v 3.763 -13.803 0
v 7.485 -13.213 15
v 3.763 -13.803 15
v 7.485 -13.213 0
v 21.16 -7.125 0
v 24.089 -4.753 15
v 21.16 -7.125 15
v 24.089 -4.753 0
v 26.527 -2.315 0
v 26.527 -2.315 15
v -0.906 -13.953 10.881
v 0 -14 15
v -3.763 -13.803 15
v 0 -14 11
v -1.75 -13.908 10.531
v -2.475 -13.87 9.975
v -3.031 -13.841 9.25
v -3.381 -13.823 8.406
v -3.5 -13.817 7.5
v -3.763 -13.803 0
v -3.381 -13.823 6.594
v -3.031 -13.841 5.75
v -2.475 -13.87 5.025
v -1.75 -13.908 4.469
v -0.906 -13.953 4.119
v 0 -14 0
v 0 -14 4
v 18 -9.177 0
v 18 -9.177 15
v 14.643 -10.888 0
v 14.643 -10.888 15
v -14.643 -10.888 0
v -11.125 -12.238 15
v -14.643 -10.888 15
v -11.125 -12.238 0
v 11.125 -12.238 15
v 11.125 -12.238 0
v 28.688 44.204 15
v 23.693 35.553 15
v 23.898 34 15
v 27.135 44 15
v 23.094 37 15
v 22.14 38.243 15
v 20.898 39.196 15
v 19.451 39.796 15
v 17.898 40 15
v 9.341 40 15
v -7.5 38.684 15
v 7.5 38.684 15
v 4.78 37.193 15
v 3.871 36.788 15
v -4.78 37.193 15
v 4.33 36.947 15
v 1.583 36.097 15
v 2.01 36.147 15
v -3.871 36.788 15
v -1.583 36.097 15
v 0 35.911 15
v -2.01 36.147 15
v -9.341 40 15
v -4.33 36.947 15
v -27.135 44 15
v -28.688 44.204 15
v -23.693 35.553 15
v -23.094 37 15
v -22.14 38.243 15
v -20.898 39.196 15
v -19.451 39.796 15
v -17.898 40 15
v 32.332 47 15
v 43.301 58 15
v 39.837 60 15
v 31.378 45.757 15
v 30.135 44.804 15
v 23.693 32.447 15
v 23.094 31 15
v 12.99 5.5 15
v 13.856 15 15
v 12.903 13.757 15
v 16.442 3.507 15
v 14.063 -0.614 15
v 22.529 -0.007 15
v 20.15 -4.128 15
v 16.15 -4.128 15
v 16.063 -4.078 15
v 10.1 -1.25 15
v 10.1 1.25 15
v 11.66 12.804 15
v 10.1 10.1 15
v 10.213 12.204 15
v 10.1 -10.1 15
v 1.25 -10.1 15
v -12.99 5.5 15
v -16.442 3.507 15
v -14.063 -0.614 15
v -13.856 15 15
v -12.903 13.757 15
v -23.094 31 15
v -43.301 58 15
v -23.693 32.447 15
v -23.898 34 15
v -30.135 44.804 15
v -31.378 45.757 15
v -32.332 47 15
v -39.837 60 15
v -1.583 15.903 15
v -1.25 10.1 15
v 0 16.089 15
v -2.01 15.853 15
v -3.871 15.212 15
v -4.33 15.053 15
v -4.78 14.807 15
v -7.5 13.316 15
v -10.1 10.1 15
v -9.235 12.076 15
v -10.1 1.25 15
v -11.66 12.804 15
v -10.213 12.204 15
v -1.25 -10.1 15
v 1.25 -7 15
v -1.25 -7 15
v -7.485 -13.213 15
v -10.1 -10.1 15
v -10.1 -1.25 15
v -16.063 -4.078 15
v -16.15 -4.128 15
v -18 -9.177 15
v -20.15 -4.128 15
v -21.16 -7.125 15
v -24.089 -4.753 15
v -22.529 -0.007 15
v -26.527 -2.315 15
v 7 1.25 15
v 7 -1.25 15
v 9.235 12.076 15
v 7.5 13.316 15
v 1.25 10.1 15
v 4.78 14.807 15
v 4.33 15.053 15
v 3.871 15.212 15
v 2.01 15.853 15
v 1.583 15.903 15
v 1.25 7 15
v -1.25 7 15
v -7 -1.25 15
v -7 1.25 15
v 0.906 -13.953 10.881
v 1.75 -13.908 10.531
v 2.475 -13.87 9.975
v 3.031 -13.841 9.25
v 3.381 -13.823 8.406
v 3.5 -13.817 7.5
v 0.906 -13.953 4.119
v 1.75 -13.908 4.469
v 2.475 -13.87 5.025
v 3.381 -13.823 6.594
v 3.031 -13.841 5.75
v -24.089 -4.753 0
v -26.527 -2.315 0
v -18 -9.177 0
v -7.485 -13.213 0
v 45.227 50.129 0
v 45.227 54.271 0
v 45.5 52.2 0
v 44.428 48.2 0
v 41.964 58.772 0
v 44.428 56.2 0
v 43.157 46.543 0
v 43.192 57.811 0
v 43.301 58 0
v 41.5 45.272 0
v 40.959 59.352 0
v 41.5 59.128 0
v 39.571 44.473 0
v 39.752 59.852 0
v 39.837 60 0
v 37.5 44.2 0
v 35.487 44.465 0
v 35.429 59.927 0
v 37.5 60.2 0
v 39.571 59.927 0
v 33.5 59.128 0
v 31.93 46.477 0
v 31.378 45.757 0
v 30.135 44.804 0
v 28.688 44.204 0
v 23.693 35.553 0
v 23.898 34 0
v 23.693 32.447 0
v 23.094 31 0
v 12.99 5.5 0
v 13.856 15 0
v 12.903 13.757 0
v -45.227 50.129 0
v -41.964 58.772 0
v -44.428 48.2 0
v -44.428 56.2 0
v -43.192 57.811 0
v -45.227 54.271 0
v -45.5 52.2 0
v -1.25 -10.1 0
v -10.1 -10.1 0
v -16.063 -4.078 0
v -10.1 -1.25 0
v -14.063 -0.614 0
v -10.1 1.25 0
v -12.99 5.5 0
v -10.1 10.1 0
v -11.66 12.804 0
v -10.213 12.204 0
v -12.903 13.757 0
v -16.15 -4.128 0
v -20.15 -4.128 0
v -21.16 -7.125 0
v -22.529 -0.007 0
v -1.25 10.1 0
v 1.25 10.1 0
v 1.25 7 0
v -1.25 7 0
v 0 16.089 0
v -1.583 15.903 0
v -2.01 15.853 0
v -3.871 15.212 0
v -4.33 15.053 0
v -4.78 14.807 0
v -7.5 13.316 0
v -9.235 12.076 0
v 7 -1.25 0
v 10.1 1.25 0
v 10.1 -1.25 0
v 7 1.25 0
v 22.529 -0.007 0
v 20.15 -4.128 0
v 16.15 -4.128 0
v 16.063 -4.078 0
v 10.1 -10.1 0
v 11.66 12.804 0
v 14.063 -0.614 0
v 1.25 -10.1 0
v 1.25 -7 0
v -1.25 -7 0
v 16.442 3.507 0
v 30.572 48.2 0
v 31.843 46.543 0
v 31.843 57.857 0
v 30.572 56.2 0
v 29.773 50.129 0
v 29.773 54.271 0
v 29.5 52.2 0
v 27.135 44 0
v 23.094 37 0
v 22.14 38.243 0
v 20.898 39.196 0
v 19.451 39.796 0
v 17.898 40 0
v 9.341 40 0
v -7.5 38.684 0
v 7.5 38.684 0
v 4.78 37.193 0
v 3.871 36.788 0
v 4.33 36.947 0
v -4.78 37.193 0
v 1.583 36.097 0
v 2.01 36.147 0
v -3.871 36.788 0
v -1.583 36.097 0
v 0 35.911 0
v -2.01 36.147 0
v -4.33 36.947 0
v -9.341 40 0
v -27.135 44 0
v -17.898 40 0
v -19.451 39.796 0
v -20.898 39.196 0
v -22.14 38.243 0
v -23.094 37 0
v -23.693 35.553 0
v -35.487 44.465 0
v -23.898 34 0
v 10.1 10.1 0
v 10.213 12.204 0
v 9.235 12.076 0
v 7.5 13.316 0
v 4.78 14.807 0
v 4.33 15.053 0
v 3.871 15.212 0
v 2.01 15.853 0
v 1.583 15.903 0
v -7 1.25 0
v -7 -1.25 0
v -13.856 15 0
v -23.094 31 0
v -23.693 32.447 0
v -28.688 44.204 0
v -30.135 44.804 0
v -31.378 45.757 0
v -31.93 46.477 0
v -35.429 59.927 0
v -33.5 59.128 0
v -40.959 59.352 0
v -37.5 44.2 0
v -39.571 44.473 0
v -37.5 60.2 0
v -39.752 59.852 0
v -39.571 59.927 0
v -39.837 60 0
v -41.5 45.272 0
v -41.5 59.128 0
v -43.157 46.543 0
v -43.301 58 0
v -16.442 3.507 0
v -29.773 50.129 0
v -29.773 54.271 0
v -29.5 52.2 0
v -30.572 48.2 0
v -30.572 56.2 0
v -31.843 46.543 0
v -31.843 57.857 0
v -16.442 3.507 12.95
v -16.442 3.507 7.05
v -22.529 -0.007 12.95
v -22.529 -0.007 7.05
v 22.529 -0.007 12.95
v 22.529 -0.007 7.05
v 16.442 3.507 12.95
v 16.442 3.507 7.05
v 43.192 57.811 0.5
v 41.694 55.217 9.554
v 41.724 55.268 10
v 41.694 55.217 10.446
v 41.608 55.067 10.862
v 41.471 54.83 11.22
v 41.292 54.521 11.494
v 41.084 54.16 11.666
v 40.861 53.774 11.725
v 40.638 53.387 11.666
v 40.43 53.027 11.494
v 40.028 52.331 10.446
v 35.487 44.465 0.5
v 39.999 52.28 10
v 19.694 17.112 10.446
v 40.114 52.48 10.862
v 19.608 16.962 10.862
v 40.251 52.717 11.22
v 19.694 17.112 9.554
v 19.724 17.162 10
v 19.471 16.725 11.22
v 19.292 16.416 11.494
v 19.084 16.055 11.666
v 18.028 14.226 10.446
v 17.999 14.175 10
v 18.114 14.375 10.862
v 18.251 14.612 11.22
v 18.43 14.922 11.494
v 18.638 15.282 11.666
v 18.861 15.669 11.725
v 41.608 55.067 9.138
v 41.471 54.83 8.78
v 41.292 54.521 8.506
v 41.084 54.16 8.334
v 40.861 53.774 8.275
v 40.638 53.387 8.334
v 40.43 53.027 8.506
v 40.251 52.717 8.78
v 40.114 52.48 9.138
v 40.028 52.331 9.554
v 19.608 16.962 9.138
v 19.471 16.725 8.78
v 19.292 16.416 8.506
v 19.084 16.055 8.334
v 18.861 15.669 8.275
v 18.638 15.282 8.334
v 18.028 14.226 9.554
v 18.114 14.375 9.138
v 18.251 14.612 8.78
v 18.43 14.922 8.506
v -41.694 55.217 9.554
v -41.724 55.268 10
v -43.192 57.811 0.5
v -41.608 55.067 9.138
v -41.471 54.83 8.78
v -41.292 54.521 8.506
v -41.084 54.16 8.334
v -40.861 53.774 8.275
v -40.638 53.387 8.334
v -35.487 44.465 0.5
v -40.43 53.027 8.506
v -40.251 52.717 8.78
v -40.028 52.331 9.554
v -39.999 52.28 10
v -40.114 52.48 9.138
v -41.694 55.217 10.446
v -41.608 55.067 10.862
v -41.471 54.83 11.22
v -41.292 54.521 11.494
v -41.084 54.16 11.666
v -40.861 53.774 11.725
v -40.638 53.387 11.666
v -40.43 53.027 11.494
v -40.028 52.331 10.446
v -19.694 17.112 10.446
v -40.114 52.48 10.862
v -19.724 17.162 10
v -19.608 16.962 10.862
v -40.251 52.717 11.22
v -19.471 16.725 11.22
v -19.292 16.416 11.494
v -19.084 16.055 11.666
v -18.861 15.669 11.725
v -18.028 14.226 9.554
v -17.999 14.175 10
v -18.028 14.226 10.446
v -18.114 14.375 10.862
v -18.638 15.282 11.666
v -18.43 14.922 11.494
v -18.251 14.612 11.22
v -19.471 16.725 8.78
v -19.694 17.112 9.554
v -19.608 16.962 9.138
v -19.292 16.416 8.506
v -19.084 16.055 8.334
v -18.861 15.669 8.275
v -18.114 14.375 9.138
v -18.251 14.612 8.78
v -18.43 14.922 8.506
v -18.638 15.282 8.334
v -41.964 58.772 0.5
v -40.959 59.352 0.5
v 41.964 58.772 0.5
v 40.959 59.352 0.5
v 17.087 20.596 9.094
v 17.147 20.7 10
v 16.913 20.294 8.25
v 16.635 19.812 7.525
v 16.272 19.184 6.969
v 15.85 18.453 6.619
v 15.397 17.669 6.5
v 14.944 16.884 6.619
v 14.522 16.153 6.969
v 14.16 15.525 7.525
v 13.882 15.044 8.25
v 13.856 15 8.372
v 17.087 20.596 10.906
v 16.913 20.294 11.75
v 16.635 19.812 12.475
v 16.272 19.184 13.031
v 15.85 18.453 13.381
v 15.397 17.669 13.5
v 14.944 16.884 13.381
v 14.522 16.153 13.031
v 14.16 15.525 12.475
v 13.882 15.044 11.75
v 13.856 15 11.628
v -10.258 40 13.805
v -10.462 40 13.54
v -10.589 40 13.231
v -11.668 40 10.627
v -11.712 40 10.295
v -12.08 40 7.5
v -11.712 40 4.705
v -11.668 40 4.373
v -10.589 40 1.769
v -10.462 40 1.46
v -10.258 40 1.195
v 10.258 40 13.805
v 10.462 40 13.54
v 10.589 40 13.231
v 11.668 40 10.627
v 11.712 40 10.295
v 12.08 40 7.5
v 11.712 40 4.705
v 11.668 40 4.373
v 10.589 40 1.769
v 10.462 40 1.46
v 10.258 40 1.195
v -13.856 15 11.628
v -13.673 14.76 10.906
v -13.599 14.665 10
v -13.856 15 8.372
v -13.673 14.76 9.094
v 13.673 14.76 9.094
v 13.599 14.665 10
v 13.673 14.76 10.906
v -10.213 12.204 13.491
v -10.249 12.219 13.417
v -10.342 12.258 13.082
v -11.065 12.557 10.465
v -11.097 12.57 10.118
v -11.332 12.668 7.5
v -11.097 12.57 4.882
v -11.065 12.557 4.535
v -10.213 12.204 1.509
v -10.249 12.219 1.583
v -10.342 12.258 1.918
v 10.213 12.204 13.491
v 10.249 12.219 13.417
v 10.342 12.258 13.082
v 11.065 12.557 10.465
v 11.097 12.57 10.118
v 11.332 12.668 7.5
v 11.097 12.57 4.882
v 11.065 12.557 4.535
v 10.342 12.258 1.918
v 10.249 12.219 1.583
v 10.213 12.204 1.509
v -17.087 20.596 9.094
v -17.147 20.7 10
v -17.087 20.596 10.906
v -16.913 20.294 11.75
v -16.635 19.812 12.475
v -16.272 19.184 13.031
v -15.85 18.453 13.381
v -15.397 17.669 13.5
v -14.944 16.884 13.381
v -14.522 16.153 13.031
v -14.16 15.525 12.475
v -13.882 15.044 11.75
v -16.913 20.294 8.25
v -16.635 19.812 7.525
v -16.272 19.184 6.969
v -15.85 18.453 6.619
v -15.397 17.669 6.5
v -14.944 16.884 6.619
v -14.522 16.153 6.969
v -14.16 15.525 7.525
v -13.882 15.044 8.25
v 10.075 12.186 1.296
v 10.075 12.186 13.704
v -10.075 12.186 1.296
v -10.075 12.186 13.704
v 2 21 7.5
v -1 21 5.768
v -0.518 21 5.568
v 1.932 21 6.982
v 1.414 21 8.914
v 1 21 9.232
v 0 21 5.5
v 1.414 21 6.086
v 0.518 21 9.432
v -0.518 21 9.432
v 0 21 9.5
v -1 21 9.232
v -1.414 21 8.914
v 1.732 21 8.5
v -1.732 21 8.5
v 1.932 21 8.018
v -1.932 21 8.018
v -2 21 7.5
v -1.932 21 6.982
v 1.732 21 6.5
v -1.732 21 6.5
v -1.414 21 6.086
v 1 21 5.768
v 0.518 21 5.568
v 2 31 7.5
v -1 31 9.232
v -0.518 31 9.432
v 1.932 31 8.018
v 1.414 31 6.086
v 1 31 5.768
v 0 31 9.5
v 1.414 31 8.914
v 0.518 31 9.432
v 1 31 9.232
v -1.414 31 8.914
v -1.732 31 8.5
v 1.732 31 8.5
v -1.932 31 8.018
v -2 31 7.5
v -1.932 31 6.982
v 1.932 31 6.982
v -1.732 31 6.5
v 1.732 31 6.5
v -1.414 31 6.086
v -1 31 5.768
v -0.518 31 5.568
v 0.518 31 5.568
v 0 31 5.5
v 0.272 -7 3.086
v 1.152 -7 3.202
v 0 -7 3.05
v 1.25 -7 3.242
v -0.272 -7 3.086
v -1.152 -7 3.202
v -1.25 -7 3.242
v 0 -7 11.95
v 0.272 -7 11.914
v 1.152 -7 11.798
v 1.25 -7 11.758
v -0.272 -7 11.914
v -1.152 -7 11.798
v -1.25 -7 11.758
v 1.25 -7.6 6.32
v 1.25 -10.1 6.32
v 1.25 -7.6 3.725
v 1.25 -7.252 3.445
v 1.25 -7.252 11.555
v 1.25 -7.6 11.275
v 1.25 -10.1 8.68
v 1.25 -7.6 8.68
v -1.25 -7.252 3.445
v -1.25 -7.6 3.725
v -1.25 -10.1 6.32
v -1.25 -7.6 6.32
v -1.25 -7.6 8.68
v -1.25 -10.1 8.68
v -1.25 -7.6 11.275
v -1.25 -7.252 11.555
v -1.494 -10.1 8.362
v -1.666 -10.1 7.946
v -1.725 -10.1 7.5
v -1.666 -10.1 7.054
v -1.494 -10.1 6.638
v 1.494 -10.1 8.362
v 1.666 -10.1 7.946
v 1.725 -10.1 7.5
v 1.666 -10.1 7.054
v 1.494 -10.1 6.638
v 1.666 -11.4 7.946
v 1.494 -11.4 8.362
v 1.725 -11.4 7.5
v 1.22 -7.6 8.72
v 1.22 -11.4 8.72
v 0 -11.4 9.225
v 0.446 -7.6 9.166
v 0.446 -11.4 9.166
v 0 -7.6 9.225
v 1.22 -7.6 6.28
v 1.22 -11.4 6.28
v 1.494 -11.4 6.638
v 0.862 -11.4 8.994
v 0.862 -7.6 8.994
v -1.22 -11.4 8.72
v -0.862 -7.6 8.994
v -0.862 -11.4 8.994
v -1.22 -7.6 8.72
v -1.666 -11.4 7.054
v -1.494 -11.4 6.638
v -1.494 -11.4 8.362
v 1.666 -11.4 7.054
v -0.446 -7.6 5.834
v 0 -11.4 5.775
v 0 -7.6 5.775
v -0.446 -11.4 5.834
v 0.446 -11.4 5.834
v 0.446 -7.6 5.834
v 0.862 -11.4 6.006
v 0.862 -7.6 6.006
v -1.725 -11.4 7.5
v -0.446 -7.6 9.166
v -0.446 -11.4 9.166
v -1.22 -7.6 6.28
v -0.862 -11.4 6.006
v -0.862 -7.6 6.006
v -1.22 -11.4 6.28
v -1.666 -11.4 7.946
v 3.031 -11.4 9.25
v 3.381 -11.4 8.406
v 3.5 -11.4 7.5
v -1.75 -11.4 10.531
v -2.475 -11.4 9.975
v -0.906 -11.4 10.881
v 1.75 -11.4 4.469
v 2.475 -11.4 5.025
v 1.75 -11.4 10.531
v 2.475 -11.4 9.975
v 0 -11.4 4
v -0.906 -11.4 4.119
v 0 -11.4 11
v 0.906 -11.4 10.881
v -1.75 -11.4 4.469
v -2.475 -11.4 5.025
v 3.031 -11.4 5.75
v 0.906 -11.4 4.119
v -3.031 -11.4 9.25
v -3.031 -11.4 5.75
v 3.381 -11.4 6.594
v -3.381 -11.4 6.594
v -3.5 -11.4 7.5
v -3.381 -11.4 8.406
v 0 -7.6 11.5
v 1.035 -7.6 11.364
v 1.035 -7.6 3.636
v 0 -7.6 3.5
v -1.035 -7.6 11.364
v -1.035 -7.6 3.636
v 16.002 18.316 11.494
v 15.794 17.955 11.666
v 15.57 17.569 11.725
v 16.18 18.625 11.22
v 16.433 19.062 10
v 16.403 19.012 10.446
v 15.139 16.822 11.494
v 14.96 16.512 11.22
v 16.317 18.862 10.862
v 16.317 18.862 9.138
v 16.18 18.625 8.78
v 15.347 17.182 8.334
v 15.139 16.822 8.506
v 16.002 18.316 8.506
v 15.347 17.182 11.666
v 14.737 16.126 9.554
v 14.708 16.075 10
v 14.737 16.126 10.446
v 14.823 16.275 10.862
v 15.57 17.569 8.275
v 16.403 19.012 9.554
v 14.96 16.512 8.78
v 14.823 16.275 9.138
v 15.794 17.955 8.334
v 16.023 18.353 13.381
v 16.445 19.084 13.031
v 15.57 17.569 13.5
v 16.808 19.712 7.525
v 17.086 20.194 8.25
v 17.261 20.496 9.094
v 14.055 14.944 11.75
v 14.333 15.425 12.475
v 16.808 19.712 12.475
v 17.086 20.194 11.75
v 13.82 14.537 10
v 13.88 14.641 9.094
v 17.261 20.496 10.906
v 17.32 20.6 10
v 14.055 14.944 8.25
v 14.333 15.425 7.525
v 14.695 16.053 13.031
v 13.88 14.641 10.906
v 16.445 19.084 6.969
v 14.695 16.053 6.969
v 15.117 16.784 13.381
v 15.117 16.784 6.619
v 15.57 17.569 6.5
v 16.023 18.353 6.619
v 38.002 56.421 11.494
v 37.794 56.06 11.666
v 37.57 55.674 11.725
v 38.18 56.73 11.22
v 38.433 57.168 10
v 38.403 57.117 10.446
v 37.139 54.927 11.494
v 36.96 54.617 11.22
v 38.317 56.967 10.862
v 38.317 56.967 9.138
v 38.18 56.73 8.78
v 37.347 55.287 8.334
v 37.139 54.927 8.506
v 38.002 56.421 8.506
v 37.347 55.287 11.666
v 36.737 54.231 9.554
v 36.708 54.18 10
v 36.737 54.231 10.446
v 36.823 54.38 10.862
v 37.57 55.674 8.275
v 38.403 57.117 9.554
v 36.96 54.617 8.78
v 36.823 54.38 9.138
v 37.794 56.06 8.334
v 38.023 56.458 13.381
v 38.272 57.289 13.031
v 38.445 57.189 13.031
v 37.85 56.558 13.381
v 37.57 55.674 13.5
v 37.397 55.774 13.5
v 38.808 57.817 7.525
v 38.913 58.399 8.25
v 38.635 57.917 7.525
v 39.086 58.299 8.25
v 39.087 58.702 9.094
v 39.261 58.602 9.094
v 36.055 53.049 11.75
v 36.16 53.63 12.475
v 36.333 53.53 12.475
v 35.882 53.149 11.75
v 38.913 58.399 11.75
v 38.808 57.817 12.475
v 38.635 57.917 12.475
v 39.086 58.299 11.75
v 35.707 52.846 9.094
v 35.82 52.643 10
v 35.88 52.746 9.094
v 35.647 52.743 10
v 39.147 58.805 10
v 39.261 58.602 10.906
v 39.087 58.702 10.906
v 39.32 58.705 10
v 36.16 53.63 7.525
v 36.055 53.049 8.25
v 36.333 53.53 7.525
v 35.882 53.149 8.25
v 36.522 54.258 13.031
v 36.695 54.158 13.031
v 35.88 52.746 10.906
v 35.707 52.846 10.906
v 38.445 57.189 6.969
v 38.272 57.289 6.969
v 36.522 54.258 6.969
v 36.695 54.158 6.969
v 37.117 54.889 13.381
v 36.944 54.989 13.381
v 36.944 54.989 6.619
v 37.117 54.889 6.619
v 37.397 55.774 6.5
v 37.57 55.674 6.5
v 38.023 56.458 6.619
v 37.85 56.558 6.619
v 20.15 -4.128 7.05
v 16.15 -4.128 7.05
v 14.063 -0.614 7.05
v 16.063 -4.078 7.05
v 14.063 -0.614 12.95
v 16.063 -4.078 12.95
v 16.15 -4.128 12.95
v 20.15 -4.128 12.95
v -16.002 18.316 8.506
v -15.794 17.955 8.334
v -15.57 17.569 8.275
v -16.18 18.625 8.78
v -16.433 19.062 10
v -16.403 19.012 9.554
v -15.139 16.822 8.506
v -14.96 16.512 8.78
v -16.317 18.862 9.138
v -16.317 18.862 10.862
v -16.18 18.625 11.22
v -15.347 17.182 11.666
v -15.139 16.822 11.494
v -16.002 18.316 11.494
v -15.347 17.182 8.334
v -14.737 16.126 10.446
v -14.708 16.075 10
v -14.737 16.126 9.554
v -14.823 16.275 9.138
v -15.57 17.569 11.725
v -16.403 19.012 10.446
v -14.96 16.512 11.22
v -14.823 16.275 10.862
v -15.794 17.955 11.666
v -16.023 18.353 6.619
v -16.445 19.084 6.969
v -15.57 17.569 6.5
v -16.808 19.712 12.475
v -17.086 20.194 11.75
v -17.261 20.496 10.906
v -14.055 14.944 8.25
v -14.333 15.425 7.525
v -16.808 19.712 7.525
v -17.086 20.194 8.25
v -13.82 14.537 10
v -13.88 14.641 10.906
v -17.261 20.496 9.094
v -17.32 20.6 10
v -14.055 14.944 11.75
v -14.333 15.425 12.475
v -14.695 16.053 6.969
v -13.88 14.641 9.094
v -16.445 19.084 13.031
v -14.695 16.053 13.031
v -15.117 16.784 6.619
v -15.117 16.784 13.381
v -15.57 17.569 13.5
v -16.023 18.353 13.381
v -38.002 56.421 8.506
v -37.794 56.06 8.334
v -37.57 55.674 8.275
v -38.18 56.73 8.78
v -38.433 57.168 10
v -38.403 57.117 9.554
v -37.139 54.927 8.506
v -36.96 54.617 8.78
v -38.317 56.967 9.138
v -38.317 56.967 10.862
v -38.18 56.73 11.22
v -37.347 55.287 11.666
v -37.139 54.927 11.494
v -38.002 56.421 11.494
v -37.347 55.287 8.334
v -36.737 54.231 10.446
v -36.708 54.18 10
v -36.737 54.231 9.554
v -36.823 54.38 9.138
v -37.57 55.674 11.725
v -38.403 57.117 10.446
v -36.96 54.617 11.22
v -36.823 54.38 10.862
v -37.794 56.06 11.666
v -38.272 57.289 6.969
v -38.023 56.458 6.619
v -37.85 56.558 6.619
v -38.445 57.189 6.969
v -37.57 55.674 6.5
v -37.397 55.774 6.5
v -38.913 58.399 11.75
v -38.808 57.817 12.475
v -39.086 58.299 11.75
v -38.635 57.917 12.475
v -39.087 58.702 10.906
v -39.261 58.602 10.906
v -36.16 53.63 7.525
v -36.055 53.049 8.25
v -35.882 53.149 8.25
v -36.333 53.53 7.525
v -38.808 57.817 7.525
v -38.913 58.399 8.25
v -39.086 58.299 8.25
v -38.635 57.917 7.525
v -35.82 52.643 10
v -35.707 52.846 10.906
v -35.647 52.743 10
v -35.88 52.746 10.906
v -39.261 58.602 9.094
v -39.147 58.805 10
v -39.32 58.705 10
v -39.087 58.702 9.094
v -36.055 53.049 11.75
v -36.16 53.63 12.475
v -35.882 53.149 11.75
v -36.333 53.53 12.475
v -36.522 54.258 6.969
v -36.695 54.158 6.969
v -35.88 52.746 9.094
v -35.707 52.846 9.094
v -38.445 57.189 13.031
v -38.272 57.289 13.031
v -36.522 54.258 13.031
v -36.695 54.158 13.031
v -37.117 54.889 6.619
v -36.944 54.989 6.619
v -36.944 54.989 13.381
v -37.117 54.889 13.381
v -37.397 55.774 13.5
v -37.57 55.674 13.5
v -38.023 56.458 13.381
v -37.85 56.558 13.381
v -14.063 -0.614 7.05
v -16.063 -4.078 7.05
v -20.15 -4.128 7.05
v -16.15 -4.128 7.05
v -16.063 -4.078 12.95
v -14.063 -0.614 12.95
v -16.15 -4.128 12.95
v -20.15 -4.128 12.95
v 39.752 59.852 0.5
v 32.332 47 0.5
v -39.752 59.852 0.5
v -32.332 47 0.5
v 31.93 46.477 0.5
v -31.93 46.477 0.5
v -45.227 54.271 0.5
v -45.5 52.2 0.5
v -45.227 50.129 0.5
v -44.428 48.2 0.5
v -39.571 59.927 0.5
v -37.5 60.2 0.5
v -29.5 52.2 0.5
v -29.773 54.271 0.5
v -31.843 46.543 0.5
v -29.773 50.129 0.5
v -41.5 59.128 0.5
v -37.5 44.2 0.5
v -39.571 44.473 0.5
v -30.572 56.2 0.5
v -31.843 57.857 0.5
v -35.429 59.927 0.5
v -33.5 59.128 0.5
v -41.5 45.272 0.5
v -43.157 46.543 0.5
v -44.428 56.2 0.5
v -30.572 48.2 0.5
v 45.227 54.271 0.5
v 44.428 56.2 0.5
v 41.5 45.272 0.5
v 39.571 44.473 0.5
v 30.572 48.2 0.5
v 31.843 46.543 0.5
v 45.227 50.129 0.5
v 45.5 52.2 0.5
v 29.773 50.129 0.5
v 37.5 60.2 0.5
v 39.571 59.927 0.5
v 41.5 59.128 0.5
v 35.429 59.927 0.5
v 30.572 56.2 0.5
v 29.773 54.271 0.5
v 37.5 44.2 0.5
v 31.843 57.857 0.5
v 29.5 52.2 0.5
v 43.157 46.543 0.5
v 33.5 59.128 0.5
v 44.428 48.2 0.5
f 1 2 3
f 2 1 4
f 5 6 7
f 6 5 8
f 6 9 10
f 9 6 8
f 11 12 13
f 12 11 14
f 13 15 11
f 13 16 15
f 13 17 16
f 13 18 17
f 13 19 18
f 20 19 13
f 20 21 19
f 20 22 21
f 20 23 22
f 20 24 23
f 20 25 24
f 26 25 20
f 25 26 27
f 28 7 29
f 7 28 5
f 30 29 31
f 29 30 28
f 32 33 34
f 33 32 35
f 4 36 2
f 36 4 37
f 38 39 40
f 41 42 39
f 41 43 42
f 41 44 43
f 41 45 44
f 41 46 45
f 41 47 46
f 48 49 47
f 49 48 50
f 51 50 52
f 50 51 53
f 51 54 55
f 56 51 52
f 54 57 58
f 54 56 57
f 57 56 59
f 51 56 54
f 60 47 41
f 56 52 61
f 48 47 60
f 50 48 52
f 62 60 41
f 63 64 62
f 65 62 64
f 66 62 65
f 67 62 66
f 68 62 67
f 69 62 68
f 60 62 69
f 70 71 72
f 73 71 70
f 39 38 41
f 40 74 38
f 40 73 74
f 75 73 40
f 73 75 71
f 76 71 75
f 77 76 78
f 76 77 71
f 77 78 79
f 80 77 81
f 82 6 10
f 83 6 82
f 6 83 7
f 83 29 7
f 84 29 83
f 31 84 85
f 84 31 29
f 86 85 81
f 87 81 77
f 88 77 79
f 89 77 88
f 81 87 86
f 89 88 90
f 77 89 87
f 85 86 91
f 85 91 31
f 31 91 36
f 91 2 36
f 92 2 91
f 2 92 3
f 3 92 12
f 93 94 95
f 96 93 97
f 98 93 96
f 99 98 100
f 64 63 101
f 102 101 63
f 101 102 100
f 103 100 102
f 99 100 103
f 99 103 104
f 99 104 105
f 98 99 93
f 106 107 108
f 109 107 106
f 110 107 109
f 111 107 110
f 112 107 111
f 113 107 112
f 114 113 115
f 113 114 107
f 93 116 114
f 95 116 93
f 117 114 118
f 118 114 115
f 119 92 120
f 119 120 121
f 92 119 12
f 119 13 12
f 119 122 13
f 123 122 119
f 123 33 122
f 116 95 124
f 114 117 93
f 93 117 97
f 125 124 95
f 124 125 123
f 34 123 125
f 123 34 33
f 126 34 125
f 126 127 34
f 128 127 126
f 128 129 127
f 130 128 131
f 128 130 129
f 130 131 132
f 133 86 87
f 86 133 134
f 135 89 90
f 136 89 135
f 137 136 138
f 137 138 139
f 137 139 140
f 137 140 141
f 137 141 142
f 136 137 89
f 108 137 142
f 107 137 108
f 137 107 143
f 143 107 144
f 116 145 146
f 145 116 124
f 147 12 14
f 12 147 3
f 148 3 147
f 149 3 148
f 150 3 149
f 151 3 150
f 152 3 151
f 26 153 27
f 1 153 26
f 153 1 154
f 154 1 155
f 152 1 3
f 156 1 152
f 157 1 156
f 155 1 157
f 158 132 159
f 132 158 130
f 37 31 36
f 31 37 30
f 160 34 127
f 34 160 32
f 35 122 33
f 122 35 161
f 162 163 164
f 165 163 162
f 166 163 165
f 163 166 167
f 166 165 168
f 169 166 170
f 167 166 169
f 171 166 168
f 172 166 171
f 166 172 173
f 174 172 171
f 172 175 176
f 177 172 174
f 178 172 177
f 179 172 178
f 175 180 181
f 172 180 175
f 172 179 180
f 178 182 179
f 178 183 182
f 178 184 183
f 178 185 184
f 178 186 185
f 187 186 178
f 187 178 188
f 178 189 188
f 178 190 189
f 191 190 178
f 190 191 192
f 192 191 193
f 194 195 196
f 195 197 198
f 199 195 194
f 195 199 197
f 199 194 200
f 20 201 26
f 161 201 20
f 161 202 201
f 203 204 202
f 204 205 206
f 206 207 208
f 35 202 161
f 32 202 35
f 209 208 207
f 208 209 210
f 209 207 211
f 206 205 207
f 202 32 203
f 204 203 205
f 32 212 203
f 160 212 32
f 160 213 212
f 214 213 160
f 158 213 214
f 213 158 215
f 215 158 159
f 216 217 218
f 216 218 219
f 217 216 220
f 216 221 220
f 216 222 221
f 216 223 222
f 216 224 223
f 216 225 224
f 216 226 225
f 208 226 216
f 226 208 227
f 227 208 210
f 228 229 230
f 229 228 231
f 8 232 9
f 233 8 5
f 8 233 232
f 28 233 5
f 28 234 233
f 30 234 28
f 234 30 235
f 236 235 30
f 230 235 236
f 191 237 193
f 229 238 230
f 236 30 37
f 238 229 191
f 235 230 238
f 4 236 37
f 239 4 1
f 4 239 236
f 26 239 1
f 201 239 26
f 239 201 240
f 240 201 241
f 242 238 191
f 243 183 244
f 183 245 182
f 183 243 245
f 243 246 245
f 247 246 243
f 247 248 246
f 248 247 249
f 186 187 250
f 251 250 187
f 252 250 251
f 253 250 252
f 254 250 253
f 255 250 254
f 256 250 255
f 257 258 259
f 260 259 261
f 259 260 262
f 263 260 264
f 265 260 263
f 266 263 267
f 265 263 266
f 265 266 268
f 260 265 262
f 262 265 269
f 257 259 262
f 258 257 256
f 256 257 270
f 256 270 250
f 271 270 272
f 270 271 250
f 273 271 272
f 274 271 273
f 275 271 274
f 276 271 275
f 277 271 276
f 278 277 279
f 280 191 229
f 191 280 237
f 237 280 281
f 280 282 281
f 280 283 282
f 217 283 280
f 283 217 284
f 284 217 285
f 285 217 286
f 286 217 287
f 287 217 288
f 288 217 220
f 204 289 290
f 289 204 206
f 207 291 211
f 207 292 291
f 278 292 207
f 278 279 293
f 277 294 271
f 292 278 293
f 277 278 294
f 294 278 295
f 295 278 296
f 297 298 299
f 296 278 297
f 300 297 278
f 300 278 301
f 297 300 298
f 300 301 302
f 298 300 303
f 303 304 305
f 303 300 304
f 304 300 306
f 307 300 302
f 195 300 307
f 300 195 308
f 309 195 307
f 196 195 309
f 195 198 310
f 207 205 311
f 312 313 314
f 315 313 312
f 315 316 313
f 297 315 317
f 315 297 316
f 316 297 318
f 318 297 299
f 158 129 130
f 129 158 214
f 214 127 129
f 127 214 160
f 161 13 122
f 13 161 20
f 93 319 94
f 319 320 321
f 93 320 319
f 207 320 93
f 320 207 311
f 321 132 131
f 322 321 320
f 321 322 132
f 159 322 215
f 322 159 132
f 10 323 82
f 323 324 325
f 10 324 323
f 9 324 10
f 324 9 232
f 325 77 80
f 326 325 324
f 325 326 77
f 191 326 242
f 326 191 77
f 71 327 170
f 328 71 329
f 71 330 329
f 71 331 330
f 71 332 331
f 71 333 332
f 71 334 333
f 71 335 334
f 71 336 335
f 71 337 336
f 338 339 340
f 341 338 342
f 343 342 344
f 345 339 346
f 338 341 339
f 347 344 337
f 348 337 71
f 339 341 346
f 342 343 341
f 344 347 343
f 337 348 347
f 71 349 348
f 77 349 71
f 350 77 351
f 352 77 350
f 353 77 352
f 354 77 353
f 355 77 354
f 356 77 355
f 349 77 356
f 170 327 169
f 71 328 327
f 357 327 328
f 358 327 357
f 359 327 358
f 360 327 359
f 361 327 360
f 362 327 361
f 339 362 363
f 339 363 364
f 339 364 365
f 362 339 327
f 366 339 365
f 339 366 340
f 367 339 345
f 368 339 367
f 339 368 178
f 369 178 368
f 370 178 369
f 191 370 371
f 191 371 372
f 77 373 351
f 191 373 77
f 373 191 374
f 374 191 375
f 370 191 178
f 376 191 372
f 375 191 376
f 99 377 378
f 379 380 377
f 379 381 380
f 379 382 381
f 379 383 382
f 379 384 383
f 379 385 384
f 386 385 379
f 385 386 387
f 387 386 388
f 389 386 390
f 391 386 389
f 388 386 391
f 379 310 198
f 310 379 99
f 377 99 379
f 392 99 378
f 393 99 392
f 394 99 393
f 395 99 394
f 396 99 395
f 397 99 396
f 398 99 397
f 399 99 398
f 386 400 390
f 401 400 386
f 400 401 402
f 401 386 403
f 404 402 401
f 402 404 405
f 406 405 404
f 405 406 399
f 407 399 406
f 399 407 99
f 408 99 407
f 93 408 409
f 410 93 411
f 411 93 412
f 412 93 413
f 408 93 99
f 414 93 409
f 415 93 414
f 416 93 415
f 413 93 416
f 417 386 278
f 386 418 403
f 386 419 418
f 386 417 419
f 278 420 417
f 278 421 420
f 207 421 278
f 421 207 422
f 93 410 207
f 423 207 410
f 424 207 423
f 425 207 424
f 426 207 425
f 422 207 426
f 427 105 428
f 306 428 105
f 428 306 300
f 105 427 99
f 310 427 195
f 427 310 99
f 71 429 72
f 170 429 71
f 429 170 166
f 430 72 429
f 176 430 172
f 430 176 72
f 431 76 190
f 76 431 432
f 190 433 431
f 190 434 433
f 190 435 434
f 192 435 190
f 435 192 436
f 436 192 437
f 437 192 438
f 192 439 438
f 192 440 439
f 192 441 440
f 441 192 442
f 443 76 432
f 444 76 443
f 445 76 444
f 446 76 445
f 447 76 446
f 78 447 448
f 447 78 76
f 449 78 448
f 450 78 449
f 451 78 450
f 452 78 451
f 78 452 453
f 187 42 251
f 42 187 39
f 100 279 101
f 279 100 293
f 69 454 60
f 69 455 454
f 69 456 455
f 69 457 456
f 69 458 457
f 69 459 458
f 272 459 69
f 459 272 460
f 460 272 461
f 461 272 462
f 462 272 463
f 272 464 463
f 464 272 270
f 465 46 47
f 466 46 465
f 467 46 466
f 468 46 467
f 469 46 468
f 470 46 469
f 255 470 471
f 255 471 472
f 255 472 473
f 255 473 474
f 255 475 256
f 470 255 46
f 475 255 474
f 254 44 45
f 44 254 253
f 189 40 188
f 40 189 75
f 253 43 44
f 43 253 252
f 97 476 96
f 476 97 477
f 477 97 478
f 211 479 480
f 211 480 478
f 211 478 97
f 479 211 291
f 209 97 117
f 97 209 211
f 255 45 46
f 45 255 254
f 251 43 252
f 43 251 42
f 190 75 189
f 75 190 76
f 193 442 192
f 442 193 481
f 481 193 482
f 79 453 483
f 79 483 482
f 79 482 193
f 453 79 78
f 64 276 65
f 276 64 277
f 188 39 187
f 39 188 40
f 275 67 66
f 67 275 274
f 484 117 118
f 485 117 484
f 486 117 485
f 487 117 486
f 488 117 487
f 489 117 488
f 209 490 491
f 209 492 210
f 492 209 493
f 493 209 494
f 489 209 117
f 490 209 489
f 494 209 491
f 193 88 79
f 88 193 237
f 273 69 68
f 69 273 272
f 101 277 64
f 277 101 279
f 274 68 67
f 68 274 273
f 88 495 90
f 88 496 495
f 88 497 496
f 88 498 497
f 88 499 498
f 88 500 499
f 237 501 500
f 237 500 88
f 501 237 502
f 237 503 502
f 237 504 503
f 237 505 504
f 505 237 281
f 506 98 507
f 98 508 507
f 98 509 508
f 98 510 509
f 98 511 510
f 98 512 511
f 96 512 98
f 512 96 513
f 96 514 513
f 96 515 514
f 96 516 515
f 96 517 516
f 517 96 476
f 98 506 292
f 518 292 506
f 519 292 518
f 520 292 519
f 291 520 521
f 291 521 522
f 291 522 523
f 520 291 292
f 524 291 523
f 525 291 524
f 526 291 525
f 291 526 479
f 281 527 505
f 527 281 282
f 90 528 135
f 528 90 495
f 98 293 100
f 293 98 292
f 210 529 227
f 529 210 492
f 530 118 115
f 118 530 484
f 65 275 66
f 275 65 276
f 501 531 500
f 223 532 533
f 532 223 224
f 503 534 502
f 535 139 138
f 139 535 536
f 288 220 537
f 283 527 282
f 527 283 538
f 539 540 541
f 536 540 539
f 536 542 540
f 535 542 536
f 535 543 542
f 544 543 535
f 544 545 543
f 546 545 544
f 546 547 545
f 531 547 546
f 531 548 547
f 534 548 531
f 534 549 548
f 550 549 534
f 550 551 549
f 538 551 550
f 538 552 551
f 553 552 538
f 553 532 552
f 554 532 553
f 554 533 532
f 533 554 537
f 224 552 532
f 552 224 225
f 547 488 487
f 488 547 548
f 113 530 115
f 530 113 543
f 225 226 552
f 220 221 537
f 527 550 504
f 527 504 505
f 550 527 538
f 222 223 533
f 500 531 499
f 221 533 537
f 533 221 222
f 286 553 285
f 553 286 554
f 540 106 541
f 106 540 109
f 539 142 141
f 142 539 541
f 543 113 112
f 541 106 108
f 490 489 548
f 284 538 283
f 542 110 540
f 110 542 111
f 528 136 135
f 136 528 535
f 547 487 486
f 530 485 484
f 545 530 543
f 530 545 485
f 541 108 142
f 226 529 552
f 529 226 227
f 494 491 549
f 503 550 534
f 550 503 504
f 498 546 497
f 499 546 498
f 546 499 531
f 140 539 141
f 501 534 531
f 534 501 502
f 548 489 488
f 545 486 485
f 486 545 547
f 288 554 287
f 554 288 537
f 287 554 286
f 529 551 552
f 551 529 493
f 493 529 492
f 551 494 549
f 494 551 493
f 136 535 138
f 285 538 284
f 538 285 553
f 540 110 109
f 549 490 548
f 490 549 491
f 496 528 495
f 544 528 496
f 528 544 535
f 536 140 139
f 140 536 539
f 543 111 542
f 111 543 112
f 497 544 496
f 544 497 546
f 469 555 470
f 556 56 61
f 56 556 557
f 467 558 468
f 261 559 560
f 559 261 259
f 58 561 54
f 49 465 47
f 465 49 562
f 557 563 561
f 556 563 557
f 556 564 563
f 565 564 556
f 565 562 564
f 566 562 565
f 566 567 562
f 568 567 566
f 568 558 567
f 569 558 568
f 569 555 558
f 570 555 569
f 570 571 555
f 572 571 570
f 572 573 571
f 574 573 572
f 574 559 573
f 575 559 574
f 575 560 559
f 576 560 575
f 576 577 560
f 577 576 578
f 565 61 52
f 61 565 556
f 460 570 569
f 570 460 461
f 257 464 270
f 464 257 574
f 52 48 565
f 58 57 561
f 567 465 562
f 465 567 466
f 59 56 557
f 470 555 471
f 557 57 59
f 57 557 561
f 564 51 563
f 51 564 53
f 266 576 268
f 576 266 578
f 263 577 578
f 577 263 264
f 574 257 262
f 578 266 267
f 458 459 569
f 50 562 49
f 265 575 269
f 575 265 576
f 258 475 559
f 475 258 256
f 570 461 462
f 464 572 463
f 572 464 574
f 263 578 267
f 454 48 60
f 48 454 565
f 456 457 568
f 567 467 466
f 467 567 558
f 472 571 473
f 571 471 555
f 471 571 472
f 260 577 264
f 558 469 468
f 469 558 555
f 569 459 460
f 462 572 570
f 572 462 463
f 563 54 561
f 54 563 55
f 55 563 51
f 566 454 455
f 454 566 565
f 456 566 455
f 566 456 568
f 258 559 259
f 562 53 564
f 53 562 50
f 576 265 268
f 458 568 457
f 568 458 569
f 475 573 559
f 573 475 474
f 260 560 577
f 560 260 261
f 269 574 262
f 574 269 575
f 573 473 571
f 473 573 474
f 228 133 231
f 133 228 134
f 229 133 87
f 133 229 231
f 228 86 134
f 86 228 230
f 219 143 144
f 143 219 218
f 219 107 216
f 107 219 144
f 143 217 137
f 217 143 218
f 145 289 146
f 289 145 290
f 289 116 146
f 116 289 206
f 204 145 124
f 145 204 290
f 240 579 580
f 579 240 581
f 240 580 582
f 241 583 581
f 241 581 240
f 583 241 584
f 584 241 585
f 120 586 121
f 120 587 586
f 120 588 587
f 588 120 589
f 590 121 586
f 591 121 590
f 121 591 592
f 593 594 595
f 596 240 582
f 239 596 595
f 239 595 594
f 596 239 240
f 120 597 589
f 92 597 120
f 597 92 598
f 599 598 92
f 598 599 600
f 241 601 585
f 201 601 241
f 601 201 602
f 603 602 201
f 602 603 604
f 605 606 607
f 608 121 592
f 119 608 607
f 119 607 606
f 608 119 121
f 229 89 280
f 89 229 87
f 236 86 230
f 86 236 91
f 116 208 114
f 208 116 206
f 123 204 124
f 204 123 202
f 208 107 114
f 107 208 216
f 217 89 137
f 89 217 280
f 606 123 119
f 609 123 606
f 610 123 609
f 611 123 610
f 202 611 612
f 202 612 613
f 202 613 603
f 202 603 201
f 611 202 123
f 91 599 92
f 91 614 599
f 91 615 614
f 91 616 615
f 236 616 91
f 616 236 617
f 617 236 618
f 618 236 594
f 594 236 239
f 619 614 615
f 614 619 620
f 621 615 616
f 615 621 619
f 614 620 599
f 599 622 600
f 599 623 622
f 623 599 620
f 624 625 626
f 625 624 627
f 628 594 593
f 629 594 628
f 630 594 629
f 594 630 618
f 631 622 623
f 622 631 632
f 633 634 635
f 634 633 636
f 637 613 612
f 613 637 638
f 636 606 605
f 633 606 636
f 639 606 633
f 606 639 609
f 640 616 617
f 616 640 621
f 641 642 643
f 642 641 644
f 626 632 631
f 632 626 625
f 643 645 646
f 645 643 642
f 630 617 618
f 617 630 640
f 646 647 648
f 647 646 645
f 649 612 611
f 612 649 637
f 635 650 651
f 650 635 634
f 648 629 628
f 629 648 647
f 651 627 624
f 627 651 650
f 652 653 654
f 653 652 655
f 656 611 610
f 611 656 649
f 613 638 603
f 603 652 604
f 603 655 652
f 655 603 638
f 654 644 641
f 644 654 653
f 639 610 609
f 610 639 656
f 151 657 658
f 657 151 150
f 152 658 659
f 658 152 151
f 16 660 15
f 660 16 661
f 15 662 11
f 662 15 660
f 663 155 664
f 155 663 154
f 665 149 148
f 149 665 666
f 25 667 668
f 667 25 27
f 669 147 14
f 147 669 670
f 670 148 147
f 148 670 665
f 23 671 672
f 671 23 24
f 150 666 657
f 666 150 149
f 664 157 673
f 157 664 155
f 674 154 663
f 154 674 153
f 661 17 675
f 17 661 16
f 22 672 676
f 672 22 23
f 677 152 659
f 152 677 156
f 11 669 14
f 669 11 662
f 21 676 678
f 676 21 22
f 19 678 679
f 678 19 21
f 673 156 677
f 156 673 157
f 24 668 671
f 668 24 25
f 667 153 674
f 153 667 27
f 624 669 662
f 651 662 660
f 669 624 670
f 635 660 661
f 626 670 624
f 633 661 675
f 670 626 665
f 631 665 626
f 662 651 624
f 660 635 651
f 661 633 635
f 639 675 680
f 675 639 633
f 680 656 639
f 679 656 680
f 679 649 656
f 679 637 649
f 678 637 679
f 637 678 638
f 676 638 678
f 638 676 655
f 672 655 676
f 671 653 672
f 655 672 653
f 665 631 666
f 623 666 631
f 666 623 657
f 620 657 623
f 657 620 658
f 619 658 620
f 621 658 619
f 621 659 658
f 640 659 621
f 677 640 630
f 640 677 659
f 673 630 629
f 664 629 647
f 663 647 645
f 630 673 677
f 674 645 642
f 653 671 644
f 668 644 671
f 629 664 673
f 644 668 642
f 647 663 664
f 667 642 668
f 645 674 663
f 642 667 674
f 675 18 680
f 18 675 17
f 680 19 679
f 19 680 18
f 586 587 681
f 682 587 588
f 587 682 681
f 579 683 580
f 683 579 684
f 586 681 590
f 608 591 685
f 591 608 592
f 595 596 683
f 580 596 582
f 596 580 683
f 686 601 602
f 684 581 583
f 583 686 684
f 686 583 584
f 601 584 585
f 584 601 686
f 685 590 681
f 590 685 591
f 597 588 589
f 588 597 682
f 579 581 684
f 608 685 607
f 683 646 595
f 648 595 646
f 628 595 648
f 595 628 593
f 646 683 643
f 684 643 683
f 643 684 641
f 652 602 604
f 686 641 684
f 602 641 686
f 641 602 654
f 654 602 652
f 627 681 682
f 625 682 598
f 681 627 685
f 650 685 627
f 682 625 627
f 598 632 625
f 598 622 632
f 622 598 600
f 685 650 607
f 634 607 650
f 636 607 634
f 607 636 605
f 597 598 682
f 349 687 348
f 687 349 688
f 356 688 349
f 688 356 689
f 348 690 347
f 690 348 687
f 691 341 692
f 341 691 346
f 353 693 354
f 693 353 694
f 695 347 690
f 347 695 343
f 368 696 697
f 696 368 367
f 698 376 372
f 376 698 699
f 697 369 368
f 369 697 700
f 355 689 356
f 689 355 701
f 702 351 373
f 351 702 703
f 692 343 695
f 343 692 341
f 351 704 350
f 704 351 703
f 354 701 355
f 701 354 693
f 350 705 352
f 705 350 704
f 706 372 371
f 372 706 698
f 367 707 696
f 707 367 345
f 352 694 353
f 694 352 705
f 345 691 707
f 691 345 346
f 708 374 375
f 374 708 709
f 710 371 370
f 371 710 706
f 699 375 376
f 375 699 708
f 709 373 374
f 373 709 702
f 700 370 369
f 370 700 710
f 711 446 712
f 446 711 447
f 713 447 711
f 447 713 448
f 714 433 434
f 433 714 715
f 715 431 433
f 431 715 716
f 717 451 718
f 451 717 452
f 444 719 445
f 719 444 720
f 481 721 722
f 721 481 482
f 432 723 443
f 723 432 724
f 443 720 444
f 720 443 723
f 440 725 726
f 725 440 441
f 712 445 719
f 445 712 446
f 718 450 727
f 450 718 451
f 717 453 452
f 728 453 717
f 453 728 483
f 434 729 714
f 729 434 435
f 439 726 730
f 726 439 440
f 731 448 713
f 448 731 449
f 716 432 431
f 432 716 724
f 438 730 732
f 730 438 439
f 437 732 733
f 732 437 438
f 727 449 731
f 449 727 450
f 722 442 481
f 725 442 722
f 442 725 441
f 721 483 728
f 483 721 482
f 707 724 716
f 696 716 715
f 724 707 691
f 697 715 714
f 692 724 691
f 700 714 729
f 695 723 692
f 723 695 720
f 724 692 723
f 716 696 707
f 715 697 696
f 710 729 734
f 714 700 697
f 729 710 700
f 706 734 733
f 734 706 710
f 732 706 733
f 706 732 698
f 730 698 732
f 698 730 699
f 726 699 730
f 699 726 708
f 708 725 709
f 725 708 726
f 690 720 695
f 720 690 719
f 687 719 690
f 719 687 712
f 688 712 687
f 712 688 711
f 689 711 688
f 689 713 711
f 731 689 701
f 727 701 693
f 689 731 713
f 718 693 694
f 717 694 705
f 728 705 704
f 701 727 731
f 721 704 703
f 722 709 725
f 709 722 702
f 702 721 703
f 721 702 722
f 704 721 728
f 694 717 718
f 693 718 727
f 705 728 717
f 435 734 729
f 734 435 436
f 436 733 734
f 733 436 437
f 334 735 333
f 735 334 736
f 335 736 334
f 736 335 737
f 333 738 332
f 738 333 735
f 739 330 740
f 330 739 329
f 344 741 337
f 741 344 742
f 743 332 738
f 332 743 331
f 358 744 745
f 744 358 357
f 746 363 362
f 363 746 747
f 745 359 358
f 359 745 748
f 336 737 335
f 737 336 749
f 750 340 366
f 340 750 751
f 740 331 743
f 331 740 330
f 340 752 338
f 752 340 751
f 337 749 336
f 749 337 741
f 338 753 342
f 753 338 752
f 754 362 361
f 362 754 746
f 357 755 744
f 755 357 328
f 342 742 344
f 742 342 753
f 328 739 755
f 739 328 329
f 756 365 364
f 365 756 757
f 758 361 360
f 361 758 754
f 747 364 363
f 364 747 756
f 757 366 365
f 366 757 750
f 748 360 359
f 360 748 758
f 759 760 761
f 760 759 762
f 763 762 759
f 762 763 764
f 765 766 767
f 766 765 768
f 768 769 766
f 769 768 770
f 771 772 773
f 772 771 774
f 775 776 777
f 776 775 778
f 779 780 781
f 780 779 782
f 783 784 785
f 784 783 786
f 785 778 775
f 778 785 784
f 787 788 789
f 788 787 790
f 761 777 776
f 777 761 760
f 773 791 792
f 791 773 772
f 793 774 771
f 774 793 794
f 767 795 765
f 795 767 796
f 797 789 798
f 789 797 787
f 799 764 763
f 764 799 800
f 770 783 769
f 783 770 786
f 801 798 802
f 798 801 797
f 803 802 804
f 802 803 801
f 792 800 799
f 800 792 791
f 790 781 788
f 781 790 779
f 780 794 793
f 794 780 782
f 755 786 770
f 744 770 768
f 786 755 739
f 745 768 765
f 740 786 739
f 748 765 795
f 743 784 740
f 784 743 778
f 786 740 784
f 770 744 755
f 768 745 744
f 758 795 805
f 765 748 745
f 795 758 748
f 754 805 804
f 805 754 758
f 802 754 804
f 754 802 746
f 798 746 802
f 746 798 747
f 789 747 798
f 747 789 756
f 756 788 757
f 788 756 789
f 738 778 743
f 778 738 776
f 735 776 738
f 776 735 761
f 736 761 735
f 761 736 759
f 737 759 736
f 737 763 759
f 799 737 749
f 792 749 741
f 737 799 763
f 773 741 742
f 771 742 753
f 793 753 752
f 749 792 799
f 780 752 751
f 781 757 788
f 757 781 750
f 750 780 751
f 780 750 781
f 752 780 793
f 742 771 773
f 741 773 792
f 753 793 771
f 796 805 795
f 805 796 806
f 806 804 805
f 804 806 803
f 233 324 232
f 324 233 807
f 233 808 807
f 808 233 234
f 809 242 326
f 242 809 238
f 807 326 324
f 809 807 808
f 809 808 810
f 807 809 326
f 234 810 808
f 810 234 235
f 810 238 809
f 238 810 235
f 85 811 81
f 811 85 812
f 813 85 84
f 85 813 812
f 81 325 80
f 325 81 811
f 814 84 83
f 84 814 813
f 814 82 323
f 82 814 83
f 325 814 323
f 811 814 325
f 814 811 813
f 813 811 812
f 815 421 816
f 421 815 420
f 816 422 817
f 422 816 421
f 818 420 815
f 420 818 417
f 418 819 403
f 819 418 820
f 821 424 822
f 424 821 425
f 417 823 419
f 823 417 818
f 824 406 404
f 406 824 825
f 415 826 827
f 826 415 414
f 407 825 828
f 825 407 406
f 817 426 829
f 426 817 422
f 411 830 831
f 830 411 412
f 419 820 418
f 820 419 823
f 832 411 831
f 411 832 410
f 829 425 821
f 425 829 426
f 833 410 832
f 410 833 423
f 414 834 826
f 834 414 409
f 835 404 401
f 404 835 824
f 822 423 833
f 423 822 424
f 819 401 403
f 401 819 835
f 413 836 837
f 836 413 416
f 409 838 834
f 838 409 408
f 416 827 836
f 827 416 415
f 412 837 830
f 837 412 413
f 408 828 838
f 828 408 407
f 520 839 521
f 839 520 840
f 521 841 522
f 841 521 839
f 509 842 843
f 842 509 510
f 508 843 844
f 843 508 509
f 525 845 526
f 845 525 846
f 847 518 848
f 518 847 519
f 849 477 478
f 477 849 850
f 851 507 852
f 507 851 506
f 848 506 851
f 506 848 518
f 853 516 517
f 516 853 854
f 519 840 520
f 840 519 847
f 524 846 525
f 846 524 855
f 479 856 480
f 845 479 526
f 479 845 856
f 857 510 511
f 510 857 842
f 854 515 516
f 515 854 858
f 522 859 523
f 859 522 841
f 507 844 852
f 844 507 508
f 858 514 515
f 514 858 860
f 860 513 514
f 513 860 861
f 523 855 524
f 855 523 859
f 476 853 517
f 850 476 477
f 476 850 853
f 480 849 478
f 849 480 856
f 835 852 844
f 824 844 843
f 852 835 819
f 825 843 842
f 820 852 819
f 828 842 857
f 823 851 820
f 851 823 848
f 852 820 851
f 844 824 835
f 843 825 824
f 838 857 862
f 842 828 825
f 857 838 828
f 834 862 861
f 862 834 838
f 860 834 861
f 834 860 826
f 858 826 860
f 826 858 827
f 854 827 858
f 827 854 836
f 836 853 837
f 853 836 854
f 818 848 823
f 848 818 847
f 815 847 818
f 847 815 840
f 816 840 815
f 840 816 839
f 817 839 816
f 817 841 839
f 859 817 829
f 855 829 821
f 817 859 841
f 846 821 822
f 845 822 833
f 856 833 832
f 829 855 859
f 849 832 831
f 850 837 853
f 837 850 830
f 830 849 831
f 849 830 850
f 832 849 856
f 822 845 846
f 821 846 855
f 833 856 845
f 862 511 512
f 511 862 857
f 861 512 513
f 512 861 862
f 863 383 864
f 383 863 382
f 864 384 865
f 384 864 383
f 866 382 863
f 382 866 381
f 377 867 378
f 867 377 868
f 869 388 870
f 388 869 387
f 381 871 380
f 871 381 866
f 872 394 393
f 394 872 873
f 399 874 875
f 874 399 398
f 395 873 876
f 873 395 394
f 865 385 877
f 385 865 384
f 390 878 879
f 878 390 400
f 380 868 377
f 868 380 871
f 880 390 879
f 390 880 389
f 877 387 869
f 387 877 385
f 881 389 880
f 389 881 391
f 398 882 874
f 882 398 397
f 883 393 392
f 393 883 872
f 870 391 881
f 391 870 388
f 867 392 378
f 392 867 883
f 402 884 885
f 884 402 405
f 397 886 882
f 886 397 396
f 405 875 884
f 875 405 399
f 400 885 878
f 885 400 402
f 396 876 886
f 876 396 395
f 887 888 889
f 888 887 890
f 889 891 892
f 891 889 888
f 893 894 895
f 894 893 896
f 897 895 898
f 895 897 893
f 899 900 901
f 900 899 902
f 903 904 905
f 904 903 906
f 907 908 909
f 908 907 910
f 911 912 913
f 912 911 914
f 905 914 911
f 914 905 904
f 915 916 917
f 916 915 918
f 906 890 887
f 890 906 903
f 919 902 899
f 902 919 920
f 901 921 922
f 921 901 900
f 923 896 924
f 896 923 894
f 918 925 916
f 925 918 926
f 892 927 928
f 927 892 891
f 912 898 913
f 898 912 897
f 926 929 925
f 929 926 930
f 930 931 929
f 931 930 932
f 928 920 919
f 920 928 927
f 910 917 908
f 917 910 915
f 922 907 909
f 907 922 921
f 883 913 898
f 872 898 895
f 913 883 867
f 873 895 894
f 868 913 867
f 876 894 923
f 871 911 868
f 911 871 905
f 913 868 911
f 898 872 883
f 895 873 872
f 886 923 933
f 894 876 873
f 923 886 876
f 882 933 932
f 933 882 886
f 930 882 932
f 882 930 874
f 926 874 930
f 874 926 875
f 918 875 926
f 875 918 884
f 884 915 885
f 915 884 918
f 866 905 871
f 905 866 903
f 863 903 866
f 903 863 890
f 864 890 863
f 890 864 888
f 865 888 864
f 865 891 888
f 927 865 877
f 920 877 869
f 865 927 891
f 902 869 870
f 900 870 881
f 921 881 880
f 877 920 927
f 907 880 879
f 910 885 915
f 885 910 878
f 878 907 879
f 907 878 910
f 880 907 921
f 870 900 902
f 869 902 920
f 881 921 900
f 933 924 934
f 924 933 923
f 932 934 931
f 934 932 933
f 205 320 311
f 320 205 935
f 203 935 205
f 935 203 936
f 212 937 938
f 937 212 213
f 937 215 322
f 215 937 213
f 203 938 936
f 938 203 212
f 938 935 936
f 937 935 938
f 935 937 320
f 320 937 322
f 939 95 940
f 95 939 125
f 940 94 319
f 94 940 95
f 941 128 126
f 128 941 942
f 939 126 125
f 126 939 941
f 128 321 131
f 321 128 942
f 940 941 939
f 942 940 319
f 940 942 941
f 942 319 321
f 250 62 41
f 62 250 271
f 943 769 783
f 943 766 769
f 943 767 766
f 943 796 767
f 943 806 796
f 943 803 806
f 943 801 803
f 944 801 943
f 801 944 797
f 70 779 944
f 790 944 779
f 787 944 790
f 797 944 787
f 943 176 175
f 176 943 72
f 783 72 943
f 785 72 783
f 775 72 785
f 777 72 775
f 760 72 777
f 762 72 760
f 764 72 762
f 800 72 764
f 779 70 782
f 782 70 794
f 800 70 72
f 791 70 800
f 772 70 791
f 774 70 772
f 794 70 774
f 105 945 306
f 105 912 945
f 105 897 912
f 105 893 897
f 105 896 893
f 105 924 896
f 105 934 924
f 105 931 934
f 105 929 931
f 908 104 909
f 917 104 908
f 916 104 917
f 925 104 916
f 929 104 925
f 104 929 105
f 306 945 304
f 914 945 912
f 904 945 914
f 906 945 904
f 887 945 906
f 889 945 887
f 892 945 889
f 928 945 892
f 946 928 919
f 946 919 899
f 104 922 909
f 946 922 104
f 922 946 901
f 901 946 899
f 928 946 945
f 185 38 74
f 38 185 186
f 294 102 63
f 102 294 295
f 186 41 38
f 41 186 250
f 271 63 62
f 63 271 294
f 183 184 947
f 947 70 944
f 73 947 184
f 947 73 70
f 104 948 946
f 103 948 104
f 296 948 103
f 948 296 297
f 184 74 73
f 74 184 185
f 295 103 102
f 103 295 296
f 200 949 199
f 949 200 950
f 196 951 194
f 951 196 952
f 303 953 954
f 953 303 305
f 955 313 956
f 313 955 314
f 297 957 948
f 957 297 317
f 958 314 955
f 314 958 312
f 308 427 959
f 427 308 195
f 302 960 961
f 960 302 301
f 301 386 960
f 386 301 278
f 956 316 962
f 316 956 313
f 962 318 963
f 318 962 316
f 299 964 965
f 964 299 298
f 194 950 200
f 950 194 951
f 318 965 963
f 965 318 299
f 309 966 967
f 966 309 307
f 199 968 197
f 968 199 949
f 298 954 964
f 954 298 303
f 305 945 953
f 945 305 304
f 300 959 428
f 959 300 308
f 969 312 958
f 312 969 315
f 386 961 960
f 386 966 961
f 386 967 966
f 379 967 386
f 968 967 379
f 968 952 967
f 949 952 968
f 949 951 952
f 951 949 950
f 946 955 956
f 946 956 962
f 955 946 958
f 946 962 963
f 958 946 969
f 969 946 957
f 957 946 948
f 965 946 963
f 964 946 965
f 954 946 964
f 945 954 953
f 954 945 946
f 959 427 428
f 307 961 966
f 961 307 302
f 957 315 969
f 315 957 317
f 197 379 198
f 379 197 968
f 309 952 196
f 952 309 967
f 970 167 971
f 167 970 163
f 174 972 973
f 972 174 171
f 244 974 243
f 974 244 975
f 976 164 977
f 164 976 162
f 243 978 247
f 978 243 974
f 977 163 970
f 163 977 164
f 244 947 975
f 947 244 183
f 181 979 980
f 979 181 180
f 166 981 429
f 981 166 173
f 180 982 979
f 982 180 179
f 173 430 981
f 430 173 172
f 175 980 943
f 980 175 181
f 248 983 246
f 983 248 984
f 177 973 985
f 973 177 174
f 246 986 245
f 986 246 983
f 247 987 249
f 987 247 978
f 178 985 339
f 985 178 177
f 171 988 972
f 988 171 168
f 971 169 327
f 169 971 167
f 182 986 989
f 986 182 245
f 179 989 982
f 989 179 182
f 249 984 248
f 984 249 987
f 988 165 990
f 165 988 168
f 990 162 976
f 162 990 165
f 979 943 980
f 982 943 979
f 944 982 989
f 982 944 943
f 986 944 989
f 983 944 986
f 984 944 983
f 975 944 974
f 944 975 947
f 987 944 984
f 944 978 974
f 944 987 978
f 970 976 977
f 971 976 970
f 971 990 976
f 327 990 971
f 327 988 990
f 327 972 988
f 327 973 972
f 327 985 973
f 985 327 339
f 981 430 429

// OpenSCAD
// file: configuration.scad
// Increase this if your slicer or printer make holes too tight.
extra_radius = 0.1;

// OD = outside diameter, corner to corner.
m3_nut_od = 6.1;
m3_nut_radius = m3_nut_od/2 + 0.2 + extra_radius;
m3_washer_radius = 3.5 + extra_radius;

// Major diameter of metric 3mm thread.
m3_major = 2.85;
m3_radius = m3_major/2 + extra_radius;
m3_wide_radius = m3_major/2 + extra_radius + 0.2;

// NEMA17 stepper motors.
motor_shaft_diameter = 5;
motor_shaft_radius = motor_shaft_diameter/2 + extra_radius;

// Frame brackets. M3x8mm screws work best with 3.6 mm brackets.
thickness = 3.6;

// OpenBeam or Misumi. Currently only 15x15 mm, but there is a plan
// to make models more parametric and allow 20x20 mm in the future.
extrusion = 20;

// Placement for the NEMA17 stepper motors.
motor_offset = 44;
motor_length = 47;
// main file
include <configuration.scad>;

$fn = 24;
roundness = 6;

module extrusion_cutout(h, extra) {
  difference() {
    cube([extrusion+extra, extrusion+extra, h], center=true);
    for (a = [0:90:359]) rotate([0, 0, a]) {
      translate([extrusion/2, 0, 0])
        cube([6, 2.5, h+1], center=true);
    }
  }
}

module screw_socket() {
  cylinder(r=m3_wide_radius, h=20, center=true);
  translate([0, 0, 3.8]) cylinder(r=3.5, h=5);
}

module screw_socket_cone() {
  union() {
    screw_socket();
    scale([1, 1, -1]) cylinder(r1=4, r2=7, h=4);
  }
}

module vertex(height, idler_offset, idler_space) {
  union() {
    // Pads to improve print bed adhesion for slim ends.
    translate([-37.5, 52.2, -height/2]) cylinder(r=8, h=0.5);
    translate([37.5, 52.2, -height/2]) cylinder(r=8, h=0.5);
    difference() {
      union() {
        intersection() {
          translate([0, 22, 0])
            cylinder(r=36, h=height, center=true, $fn=60);
          translate([0, -37, 0]) rotate([0, 0, 30])
            cylinder(r=50, h=height+1, center=true, $fn=6);
        }
        translate([0, 38, 0]) intersection() {
          rotate([0, 0, -90])
            cylinder(r=55, h=height, center=true, $fn=3);
          translate([0, 10, 0])
            cube([100, 100, 2*height], center=true);
          translate([0, -10, 0]) rotate([0, 0, 30])
            cylinder(r=55, h=height+1, center=true, $fn=6);
        }
      }
      difference() {
        translate([0, 58, 0]) minkowski() {
          intersection() {
            rotate([0, 0, -90])
              cylinder(r=55, h=height, center=true, $fn=3);
            translate([0, -32, 0])
              cube([100, 16, 2*height], center=true);
          }
          cylinder(r=roundness, h=1, center=true);
        }
        // Idler support cones.
        translate([0, 26+idler_offset-30, 0]) rotate([-90, 0, 0])
          cylinder(r1=30, r2=2, h=30-idler_space/2);
        translate([0, 26+idler_offset+30, 0]) rotate([90, 0, 0])
          cylinder(r1=30, r2=2, h=30-idler_space/2);
      }
      translate([0, 58, 0]) minkowski() {
        intersection() {
          rotate([0, 0, -90])
            cylinder(r=55, h=height, center=true, $fn=3);
          translate([0, 7, 0])
            cube([100, 30, 2*height], center=true);
        }
        cylinder(r=roundness, h=1, center=true);
      }
      extrusion_cutout(height+10, 2*extra_radius);
      for (z = [0:2*extrusion:height]) {
        translate([0, -7.5-extra_radius, z+7.5-height/2]) rotate([90, 0, 0])
          screw_socket_cone();
        for (a = [-1, 1]) {
          rotate([0, 0, 30*a]) translate([-16*a, 111, z+(extrusion/2)-height/2]) {
            // % rotate([90, 0, 0]) extrusion_cutout(200, 0);
            // Screw sockets.
            for (y = [-88, -44]) {
              translate([a*7.5, y, 0]) rotate([0, a*90, 0]) screw_socket();
            }
            // Nut tunnels.
	    for (z = [-1, 1]) {
	      scale([1, 1, z]) translate([0, -100, 3]) minkowski() {
	        rotate([0, 0, -a*30]) cylinder(r=4, h=16, $fn=6);
		cube([0.1, 5, 0.1], center=true);
	      }
            }
          }
        }
      }
    }
  }
}

translate([0, 0, 7.5]) vertex(15, idler_offset=0, idler_space=10);
